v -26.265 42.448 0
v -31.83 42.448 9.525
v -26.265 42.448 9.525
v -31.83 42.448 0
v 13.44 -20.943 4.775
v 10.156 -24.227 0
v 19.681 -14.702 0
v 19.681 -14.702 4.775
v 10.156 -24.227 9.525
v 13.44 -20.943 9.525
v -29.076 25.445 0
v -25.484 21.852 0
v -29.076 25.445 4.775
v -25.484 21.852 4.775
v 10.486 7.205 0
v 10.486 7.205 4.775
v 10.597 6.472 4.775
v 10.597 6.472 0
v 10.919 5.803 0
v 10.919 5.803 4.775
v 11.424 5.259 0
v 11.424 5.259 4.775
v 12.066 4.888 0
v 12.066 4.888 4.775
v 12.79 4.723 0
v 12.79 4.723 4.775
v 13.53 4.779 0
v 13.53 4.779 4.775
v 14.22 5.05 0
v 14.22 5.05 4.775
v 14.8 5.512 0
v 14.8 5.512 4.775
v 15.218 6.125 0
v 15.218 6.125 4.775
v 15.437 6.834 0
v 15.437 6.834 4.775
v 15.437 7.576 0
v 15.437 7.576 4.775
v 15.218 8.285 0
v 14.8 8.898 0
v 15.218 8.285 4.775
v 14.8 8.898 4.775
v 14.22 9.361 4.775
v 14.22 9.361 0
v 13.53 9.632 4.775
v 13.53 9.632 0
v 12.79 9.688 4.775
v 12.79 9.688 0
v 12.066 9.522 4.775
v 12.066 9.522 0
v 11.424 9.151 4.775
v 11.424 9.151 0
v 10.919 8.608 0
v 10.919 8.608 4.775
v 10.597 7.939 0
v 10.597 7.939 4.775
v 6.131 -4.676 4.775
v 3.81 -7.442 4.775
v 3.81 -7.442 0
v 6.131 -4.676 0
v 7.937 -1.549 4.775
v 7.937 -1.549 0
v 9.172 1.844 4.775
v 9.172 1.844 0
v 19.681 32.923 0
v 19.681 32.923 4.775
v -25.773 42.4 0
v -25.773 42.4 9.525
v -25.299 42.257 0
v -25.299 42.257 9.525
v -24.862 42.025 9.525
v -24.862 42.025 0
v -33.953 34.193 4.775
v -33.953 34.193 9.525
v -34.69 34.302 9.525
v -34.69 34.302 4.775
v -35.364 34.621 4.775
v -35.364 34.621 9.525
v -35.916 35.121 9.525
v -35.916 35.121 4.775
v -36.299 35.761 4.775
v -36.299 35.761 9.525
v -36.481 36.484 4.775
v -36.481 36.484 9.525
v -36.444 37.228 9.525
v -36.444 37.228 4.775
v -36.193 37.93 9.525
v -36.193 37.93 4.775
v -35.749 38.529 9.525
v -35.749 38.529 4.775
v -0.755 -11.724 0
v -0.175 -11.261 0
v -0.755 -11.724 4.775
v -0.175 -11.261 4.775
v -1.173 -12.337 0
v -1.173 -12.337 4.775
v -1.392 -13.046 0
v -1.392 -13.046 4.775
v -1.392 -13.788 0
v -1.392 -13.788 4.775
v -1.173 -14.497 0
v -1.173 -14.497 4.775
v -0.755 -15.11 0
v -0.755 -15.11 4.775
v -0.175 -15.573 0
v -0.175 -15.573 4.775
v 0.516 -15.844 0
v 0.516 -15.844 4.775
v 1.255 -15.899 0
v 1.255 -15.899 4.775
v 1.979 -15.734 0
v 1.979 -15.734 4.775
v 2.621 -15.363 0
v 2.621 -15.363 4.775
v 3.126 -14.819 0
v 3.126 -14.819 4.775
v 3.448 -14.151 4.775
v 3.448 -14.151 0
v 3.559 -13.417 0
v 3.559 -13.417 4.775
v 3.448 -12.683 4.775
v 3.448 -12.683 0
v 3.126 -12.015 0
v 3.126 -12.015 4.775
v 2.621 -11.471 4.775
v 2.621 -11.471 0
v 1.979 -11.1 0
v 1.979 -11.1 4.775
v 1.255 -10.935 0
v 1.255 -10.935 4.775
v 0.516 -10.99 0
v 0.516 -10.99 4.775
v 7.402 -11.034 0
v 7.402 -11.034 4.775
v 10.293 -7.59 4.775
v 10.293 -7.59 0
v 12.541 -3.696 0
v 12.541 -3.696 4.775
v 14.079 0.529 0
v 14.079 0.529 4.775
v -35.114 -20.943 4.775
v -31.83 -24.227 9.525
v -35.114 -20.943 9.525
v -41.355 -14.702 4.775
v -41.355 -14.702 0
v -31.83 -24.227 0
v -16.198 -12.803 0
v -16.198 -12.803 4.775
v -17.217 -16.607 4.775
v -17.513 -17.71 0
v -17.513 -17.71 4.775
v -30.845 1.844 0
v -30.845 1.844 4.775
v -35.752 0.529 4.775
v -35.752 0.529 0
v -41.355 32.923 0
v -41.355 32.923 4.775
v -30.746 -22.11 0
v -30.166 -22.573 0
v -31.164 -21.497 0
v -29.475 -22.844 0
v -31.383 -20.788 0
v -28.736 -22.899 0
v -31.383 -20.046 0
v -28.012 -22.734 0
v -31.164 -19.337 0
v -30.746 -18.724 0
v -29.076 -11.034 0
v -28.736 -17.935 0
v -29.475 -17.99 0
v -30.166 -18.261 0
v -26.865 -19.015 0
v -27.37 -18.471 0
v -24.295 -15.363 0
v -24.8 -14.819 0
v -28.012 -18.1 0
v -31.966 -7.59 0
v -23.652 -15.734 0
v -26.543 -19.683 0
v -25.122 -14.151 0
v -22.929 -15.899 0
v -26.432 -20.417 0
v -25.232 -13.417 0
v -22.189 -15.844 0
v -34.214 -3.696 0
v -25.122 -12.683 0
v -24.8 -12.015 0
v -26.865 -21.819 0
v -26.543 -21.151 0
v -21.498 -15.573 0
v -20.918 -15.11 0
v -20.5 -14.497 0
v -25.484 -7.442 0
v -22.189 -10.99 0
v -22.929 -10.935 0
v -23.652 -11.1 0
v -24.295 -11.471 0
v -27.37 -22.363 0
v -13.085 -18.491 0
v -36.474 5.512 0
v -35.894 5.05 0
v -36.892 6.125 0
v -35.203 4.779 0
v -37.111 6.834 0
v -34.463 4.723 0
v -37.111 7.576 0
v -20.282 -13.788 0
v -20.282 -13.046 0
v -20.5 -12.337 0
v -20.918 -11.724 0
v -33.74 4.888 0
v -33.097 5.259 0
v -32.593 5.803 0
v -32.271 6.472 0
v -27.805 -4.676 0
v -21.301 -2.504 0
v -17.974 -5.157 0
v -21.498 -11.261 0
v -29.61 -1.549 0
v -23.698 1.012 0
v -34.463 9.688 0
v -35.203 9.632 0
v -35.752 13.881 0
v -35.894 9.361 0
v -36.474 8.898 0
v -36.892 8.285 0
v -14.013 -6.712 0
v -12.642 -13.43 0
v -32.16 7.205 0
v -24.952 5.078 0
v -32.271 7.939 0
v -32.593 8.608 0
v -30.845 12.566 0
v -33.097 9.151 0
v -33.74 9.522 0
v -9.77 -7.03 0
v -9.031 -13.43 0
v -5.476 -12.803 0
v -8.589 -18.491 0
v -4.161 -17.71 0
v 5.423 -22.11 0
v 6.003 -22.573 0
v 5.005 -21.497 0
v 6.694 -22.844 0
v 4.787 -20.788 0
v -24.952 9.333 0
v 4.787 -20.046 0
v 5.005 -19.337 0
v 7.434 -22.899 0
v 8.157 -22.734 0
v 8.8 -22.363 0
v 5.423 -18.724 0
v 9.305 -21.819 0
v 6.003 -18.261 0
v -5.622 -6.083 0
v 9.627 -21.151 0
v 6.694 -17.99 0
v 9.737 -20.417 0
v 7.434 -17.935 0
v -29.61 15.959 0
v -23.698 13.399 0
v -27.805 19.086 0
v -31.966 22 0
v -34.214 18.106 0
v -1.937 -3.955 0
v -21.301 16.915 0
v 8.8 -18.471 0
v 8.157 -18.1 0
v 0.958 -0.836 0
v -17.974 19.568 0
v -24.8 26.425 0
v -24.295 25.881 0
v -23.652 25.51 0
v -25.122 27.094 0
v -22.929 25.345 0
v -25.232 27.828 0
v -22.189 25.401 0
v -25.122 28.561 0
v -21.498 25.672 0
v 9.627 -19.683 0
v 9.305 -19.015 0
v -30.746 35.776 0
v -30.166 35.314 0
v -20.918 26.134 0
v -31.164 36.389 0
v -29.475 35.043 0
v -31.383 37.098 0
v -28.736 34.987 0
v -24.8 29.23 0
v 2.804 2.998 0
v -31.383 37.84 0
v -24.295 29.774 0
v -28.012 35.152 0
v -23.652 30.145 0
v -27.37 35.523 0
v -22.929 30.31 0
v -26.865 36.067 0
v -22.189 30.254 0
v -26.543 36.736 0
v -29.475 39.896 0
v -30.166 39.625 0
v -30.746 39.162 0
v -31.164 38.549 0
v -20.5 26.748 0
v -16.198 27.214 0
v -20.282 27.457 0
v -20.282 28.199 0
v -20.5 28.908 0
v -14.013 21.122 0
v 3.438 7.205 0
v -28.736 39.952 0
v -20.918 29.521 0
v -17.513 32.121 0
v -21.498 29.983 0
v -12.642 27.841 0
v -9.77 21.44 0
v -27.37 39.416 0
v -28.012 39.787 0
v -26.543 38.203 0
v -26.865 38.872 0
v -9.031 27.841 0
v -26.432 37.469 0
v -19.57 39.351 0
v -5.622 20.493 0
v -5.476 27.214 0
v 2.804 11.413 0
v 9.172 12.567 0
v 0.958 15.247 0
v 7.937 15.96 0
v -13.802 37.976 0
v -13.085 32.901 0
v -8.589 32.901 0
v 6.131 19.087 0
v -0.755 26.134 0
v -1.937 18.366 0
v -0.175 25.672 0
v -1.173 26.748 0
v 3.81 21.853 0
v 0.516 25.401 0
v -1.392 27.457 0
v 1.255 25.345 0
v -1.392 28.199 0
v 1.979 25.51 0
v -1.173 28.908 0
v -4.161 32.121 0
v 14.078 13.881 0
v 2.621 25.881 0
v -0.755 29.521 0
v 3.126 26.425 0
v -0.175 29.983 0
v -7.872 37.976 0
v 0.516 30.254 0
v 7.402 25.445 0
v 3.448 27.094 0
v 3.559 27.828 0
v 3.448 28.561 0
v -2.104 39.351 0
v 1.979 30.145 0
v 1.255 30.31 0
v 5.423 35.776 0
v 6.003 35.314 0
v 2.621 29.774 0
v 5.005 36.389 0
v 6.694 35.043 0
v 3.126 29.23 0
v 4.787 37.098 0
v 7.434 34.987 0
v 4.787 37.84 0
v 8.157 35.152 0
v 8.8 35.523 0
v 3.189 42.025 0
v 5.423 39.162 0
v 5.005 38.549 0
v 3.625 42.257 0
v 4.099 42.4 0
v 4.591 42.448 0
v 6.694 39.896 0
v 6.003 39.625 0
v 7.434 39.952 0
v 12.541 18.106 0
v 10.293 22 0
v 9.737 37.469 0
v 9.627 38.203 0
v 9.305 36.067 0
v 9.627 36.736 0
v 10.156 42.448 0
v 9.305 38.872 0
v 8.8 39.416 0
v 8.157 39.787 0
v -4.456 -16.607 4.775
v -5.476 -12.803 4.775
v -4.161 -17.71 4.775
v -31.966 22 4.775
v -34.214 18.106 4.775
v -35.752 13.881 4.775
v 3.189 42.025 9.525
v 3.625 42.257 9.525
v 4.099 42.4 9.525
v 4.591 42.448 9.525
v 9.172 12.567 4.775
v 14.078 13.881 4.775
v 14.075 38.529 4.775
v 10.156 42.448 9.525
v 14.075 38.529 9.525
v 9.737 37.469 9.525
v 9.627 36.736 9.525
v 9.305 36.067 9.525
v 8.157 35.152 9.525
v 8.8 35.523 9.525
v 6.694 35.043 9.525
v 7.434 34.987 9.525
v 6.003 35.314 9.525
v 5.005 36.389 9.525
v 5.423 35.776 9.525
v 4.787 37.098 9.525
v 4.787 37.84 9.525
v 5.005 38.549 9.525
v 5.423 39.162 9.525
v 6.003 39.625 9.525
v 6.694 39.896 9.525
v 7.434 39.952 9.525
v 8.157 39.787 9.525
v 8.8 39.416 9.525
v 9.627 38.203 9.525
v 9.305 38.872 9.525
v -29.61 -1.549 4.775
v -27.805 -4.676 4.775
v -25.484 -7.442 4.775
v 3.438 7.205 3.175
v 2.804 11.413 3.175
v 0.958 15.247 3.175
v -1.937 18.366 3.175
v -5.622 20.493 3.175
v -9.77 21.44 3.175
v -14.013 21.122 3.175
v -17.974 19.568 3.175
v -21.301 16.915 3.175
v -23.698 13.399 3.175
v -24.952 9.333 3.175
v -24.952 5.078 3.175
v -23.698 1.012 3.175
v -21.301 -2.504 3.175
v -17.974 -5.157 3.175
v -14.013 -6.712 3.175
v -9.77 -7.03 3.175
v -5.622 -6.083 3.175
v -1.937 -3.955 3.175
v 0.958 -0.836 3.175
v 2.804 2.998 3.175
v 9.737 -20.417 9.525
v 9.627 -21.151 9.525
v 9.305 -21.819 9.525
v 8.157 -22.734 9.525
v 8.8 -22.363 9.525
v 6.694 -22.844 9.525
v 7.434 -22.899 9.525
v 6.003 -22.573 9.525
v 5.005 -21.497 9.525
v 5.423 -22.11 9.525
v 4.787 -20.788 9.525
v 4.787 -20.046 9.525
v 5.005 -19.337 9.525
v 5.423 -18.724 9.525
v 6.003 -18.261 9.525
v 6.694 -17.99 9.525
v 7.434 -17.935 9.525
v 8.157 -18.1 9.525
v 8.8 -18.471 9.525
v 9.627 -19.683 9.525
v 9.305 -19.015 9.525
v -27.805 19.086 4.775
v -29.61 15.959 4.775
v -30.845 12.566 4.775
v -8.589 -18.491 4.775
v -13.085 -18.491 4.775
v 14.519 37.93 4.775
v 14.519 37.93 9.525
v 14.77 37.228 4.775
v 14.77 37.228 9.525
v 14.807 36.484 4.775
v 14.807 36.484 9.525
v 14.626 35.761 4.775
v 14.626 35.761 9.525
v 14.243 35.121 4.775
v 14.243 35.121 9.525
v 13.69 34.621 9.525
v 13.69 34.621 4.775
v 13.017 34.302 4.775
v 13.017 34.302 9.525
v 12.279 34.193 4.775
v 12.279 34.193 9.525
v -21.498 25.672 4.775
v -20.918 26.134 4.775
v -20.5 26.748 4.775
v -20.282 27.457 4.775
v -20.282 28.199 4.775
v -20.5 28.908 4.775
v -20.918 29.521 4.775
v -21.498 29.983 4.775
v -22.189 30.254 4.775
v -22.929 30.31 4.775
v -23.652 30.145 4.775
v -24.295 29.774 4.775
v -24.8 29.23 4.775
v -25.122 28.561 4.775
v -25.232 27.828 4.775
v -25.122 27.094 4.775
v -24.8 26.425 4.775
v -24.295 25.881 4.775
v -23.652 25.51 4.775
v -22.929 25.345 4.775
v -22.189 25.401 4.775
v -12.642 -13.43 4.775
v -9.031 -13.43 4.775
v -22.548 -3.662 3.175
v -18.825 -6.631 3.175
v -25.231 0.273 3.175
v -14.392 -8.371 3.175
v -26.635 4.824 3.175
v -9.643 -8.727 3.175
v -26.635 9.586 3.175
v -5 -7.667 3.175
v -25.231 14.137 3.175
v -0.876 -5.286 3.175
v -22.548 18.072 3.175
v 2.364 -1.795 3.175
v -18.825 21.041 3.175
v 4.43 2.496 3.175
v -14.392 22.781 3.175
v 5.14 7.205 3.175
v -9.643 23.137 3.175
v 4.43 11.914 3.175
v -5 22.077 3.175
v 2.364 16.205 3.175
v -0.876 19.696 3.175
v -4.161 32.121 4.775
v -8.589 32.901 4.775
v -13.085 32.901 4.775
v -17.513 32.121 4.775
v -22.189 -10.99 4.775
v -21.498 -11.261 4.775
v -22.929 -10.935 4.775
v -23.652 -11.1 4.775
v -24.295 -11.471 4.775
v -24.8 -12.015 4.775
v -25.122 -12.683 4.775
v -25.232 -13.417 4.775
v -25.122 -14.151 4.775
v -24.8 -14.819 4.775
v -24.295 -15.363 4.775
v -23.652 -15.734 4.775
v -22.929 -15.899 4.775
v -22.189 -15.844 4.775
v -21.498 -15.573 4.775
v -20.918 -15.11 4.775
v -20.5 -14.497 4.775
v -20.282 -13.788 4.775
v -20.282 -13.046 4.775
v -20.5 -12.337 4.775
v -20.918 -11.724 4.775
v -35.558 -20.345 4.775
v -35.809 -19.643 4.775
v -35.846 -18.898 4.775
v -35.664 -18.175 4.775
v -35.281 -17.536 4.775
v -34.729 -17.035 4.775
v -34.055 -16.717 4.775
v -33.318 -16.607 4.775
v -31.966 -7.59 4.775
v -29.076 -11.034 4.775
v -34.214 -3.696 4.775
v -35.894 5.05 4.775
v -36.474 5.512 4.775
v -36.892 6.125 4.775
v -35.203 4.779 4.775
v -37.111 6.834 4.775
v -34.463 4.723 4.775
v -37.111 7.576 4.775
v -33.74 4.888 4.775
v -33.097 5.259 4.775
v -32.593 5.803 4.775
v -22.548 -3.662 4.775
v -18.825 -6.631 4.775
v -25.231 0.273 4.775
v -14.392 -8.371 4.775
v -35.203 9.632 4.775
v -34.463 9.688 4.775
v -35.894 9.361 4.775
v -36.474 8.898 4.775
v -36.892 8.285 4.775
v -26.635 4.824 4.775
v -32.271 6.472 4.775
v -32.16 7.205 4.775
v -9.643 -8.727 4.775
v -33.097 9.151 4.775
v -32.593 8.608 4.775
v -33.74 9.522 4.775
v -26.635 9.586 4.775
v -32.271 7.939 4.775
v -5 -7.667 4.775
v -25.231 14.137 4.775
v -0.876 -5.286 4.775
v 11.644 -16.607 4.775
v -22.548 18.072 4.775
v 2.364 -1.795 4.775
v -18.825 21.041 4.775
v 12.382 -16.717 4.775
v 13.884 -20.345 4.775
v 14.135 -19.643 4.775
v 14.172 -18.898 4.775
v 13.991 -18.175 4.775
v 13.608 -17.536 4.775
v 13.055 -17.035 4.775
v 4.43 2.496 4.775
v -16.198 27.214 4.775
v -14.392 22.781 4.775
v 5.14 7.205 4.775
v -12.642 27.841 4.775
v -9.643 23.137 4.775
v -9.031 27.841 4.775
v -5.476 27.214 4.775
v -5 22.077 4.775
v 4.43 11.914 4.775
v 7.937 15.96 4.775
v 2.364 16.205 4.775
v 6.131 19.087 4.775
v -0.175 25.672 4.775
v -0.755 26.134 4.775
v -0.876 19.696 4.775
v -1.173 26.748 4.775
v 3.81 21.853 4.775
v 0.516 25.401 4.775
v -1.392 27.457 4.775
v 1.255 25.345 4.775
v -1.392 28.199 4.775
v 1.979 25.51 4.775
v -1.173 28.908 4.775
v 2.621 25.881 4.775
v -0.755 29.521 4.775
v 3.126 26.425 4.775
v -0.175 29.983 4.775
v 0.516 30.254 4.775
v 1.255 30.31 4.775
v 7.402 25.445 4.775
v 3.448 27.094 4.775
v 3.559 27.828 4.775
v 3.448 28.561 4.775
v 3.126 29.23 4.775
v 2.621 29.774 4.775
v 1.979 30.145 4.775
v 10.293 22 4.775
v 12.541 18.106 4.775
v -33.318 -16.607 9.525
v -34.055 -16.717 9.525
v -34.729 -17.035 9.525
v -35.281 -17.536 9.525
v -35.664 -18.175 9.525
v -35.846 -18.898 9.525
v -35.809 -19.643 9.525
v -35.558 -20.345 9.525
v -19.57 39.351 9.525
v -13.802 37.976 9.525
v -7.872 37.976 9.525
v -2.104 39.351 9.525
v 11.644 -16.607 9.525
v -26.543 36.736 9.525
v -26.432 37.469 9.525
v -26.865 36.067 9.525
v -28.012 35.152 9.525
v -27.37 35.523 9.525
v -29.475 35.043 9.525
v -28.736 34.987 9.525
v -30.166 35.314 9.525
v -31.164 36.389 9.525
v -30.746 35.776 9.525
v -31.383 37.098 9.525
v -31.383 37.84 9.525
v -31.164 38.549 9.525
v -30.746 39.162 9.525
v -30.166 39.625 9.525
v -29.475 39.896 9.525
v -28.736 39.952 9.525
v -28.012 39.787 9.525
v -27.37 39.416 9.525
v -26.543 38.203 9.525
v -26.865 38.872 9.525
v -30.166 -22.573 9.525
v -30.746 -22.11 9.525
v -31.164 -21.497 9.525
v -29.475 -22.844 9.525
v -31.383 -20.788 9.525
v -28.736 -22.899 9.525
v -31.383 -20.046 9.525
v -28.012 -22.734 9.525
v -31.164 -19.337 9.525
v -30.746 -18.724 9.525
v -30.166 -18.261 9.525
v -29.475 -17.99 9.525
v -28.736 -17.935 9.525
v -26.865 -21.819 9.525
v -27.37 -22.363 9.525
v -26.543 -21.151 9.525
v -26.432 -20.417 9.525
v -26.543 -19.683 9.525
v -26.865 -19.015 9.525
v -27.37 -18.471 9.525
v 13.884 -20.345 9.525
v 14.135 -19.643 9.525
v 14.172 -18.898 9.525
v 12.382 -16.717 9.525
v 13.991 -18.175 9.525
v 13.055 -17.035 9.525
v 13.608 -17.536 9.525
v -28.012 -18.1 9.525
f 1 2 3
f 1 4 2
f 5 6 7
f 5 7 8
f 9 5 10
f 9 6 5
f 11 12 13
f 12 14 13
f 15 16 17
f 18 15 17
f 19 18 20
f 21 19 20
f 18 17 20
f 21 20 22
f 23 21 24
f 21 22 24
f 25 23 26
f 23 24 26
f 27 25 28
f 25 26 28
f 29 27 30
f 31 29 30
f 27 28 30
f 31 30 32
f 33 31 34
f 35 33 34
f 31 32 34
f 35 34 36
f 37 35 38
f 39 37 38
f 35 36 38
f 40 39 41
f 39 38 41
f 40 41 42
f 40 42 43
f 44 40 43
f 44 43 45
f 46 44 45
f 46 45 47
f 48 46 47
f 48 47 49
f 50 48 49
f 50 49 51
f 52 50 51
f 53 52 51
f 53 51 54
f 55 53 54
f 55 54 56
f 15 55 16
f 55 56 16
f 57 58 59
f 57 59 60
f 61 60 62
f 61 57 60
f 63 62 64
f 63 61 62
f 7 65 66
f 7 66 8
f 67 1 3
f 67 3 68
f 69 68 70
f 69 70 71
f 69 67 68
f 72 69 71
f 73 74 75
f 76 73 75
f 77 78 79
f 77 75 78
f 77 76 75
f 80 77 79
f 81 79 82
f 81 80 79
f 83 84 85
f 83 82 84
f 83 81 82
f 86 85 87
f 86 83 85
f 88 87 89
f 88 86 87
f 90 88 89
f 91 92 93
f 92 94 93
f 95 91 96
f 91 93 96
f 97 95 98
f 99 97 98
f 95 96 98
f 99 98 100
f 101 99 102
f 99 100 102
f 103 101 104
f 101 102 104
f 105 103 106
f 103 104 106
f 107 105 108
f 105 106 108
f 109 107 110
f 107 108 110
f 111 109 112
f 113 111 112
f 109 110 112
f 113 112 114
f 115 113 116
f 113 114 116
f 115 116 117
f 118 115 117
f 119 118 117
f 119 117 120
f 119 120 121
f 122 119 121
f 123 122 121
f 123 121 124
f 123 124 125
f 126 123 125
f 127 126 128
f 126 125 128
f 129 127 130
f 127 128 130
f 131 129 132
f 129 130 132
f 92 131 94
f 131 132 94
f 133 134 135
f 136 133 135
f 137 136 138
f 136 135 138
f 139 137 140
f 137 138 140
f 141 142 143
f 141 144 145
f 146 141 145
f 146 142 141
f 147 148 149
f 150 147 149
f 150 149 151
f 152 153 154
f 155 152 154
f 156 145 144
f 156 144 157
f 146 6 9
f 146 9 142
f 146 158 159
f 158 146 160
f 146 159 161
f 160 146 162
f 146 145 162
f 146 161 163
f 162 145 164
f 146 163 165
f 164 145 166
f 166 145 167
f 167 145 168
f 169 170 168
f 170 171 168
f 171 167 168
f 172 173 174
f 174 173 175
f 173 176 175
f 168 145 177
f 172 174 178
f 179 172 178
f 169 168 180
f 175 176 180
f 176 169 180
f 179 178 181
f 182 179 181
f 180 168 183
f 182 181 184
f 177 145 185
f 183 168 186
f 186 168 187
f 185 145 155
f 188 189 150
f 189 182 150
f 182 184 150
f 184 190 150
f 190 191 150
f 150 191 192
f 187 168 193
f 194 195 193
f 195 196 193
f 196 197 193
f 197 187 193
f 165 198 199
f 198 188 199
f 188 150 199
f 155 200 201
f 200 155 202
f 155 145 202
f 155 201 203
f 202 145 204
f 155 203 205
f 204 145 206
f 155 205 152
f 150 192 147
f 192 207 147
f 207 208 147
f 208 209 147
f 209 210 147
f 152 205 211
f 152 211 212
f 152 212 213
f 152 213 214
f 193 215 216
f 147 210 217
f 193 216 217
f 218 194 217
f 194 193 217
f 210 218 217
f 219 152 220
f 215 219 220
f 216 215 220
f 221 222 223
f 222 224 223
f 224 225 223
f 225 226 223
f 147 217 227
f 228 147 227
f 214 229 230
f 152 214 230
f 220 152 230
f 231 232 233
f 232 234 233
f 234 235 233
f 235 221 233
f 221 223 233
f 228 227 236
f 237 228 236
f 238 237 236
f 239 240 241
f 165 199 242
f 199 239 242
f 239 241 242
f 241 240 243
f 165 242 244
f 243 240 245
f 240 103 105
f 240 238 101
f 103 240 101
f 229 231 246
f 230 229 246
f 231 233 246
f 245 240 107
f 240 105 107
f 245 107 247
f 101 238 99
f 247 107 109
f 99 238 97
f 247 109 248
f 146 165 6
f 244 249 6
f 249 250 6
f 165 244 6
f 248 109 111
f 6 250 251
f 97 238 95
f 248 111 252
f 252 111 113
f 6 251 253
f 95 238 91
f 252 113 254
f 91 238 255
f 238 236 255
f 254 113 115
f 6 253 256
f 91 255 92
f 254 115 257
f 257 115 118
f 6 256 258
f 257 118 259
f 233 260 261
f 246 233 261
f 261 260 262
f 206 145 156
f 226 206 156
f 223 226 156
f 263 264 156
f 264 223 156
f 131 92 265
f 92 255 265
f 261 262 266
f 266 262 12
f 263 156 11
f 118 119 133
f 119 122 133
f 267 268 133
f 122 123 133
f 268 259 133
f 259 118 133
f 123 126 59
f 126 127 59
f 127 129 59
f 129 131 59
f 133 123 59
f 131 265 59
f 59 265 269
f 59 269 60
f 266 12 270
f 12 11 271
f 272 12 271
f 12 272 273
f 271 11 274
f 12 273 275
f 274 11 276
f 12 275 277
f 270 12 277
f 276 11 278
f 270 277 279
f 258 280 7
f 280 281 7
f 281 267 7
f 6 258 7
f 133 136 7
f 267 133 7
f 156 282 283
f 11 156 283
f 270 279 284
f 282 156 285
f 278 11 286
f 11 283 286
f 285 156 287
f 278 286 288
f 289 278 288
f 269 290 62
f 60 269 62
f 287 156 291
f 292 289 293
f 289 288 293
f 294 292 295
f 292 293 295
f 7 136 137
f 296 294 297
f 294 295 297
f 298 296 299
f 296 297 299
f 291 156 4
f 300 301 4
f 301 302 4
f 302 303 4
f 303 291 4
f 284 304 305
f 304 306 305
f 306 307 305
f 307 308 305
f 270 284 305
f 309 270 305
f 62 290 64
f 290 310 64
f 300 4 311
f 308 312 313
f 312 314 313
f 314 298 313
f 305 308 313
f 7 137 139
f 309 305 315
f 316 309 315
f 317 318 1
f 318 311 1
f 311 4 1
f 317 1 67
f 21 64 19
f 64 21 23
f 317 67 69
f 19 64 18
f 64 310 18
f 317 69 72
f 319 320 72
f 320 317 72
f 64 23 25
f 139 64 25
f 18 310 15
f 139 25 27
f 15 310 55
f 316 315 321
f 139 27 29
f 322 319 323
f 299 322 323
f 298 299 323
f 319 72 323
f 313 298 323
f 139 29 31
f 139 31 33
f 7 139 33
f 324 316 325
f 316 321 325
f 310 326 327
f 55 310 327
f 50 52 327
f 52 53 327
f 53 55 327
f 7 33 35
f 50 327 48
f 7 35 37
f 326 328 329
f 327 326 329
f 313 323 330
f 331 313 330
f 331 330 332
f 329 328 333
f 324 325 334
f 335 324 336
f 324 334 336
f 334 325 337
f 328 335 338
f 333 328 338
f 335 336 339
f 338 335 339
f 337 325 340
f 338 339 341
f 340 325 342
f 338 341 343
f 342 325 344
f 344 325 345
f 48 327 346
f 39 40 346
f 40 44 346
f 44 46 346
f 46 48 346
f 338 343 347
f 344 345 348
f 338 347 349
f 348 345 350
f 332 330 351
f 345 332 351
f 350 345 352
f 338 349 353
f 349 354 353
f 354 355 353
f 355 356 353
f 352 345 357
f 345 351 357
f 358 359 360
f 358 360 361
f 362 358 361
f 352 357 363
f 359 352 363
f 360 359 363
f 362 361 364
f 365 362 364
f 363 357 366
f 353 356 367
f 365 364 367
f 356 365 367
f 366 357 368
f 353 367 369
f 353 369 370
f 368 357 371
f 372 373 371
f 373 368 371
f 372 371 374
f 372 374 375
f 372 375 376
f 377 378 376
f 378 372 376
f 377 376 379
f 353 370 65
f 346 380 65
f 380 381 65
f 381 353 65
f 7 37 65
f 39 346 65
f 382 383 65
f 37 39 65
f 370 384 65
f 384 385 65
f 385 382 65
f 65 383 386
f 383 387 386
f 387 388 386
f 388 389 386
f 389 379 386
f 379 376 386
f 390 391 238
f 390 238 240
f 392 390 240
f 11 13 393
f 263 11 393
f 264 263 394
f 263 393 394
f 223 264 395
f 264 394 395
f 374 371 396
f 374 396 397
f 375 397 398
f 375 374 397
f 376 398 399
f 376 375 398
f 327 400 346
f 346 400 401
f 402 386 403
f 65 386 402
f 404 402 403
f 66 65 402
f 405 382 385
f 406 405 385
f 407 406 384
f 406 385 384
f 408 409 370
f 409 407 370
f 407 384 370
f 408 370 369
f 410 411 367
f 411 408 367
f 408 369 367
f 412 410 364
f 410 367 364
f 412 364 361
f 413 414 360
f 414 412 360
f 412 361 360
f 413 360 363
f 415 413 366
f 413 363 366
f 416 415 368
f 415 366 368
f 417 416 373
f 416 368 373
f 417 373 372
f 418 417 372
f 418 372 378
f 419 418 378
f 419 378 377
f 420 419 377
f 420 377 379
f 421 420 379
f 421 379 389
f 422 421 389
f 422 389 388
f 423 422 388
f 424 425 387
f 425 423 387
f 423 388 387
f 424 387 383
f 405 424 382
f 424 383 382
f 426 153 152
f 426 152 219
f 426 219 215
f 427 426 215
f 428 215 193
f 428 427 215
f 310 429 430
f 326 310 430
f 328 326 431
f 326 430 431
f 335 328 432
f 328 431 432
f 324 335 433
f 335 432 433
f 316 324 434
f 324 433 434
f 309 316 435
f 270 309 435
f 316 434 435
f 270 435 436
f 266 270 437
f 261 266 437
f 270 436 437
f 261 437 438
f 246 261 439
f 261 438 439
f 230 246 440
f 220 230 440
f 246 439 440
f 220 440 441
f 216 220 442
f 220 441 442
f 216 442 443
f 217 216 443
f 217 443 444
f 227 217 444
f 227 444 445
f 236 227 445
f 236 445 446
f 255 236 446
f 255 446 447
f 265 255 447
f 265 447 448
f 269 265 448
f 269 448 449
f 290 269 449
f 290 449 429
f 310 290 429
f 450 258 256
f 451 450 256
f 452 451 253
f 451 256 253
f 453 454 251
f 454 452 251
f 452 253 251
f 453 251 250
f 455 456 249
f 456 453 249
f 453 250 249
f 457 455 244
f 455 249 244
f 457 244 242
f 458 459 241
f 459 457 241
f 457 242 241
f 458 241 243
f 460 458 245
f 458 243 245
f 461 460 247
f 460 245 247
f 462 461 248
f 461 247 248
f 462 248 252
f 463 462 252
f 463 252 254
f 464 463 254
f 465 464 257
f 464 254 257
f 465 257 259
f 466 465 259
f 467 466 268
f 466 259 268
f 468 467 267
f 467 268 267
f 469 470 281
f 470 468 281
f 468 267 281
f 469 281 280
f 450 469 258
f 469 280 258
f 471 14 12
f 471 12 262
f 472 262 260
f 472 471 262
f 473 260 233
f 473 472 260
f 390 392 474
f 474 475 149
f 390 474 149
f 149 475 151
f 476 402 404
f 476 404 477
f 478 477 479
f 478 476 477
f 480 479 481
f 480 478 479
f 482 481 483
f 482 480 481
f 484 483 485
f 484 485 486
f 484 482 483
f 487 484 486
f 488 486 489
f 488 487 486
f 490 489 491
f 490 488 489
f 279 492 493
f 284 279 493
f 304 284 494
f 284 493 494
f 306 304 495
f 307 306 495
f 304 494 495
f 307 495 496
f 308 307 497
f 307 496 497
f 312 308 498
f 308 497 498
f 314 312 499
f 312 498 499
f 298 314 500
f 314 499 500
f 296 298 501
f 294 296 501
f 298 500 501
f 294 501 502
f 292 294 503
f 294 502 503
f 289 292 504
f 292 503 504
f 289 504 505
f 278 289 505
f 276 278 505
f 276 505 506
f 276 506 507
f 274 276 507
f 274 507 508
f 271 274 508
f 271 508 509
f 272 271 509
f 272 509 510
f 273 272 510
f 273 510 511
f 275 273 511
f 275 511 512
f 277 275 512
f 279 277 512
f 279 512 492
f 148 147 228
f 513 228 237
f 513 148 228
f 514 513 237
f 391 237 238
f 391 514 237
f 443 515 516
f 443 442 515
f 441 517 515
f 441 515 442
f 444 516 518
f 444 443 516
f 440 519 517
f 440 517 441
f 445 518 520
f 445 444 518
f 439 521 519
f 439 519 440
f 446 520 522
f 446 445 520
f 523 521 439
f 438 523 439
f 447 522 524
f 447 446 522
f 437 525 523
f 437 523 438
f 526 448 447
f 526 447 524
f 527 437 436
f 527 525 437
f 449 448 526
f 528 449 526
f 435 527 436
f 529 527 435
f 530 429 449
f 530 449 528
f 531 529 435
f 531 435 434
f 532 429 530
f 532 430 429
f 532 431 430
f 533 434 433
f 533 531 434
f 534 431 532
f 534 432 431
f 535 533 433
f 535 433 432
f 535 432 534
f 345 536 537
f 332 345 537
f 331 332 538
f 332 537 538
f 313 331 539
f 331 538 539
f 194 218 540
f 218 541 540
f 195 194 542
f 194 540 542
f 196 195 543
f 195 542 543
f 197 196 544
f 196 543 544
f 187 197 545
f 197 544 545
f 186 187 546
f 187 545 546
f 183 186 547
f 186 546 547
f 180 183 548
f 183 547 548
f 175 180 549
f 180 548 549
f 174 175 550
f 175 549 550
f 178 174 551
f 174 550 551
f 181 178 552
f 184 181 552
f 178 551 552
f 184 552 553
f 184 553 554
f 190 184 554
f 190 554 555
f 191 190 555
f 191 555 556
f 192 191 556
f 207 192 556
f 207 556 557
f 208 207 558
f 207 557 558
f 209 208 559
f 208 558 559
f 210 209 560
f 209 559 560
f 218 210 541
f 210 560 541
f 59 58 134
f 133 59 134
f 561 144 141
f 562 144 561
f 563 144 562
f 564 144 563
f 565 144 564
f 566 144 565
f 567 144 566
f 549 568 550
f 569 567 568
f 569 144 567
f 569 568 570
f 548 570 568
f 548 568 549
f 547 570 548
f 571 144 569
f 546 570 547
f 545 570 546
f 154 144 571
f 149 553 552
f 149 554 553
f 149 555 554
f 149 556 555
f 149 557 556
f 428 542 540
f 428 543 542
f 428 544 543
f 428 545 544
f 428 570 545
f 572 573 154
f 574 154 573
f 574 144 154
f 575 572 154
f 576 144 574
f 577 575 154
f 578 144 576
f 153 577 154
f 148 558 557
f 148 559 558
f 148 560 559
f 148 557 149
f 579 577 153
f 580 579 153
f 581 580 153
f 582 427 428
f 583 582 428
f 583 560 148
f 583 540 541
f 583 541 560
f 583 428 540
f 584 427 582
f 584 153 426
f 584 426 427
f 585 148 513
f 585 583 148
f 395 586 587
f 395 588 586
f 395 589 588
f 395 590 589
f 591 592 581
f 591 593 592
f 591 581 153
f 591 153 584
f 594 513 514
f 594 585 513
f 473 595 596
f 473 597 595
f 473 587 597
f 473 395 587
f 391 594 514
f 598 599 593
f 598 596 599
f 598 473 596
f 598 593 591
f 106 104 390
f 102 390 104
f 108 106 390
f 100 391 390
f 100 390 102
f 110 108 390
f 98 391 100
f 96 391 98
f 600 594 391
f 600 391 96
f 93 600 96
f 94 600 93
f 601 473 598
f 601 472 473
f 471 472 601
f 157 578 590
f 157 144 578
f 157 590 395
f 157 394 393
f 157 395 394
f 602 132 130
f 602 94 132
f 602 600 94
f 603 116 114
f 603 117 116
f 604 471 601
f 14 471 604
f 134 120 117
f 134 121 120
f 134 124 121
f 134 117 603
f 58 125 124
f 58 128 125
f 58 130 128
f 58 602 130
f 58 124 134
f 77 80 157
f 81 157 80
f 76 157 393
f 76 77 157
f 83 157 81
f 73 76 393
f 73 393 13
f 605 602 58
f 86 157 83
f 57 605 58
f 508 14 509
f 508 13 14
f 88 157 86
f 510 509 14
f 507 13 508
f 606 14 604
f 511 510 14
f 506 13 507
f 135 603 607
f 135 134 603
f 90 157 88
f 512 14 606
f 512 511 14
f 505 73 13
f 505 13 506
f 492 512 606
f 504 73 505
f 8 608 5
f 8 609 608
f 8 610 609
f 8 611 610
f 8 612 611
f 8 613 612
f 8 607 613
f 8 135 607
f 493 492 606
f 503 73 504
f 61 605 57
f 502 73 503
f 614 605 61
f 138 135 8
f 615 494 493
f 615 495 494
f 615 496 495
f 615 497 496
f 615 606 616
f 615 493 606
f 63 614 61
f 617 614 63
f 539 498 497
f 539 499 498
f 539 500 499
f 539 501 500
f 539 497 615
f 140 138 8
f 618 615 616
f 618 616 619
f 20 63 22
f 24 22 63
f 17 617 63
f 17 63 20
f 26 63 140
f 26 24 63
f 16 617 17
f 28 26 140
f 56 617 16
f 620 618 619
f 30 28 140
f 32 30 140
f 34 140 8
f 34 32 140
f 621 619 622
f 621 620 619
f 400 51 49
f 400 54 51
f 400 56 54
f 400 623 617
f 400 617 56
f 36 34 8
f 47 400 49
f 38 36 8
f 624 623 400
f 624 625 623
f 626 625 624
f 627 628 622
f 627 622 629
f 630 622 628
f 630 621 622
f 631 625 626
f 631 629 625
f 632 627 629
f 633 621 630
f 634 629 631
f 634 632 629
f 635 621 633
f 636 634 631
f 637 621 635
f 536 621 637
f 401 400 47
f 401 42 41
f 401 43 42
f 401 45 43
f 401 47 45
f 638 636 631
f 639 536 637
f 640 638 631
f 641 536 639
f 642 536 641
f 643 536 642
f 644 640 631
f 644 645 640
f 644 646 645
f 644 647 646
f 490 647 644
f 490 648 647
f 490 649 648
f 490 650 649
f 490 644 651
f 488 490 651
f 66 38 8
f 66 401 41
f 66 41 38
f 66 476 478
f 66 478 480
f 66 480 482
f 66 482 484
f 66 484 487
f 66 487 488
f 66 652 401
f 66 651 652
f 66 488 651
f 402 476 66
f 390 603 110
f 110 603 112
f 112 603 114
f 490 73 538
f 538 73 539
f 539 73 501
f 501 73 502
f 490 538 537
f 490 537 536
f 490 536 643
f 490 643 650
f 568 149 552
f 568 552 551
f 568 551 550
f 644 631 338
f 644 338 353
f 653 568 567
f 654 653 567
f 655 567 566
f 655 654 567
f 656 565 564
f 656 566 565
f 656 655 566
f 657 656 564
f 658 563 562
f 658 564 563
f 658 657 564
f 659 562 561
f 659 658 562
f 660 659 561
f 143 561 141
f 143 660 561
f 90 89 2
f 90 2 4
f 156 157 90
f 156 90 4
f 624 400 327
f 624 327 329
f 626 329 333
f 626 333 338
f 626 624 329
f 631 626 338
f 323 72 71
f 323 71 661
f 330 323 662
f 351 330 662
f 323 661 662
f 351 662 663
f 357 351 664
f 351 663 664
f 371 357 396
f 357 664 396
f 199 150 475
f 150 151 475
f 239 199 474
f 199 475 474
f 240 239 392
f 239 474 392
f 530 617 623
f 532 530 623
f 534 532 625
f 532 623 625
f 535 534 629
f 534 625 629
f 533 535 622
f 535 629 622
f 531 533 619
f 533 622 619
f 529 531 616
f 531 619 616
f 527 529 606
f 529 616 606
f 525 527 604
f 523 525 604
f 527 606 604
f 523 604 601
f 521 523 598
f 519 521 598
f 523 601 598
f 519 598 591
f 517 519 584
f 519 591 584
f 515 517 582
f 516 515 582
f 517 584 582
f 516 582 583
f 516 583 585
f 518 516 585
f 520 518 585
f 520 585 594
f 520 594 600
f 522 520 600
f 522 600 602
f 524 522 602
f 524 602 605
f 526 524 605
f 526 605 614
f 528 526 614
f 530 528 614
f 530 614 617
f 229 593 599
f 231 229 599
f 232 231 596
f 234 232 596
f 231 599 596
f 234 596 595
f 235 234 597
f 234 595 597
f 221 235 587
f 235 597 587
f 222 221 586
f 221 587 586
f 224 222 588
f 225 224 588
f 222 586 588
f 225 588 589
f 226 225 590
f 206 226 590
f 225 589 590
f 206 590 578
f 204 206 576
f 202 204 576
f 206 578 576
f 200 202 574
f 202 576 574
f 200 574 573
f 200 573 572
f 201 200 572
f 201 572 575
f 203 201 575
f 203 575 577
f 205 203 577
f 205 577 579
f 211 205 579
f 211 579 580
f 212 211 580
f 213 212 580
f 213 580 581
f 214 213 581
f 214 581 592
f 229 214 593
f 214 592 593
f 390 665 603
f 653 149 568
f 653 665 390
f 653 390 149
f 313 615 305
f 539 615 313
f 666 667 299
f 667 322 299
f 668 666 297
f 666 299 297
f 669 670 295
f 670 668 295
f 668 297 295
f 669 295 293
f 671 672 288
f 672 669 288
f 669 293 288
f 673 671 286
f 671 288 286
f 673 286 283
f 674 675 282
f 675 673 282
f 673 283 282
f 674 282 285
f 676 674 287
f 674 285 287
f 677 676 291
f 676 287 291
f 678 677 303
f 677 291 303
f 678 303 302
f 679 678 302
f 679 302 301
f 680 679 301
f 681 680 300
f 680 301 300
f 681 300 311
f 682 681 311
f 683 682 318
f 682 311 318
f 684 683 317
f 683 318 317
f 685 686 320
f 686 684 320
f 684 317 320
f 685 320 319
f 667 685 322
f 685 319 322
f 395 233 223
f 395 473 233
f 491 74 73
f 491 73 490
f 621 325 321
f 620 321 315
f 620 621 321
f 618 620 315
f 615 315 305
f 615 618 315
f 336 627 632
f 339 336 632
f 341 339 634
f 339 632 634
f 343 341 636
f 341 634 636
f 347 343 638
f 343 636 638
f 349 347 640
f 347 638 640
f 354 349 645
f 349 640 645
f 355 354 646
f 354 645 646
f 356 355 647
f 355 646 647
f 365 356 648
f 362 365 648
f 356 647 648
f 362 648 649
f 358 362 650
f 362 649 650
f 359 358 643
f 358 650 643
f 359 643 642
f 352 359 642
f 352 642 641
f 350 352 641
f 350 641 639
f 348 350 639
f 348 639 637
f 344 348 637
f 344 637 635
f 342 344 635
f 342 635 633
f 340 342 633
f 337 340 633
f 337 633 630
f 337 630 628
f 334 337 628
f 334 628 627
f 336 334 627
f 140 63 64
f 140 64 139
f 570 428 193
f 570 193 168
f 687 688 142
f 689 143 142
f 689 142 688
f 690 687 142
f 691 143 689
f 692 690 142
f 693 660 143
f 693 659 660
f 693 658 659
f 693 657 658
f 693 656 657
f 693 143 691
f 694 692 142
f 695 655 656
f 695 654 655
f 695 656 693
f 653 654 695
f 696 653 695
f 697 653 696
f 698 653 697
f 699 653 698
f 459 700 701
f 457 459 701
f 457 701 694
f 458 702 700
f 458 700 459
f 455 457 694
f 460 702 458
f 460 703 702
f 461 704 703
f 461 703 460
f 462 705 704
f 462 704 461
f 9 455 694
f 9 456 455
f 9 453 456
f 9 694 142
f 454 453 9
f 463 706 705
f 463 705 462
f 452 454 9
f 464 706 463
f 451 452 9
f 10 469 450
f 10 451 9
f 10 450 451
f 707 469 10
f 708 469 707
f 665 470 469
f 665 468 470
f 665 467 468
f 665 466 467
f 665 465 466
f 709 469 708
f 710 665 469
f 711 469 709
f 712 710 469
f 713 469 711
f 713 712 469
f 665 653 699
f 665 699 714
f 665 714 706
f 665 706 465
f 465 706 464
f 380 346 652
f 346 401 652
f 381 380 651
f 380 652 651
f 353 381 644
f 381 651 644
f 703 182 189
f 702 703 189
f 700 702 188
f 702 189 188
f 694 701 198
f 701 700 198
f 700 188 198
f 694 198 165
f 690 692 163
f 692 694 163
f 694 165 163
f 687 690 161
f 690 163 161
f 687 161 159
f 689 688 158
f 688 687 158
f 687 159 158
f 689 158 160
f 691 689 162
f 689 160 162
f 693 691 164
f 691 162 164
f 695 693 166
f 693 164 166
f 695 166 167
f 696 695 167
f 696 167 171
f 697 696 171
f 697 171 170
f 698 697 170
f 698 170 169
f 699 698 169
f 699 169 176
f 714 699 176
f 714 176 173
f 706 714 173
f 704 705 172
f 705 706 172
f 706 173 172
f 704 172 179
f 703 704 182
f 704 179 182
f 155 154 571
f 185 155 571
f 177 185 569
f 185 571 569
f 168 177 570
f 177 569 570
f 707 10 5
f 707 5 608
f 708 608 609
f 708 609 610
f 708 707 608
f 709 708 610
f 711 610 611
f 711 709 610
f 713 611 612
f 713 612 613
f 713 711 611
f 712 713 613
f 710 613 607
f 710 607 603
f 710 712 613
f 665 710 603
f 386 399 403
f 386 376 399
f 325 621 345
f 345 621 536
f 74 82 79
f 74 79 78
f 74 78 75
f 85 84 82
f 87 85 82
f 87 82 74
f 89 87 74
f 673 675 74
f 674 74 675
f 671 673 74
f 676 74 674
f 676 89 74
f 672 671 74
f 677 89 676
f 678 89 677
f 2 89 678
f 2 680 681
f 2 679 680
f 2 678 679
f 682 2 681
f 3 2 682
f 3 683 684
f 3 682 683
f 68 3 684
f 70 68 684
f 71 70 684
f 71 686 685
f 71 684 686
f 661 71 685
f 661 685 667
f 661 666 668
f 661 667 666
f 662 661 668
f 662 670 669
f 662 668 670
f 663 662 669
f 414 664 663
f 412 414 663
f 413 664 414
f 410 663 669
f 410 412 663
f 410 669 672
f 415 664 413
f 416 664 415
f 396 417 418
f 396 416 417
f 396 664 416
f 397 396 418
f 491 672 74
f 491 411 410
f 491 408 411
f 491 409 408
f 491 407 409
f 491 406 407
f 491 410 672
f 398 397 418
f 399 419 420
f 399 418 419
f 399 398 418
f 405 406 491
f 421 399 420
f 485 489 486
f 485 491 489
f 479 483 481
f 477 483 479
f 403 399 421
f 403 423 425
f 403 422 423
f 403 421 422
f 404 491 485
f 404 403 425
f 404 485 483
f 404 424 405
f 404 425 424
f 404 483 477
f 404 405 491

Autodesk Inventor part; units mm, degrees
ref_plane "YZ Plane" through (0, 0, 0) normal (1, 0, 0) x (0, 1, 0)
ref_plane "XZ Plane" through (0, 0, 0) normal (0, 1, 0) x (-1, 0, 0)
ref_plane "XY Plane" through (0, 0, 0) normal (0, 0, 1) x (1, 0, 0)
sketch "Sketch2" plane through (0, 0, 0) normal (0, 0, 1) x (1, 0, 0)
  line L0 (-10.8368, 23.5104) -> (-10.8368, -29.6906) construction
  line L1 (-37.8996, -2.6413) -> (16.2259, -2.6413) construction
  circle A0 centre (-28.9216, 37.4694) radius 2.4892
  circle A1 centre (7.248, 37.4694) radius 2.4892
  circle A2 centre (-28.9216, -20.4172) radius 2.4892
  circle A3 centre (7.248, -20.4172) radius 2.4892
  line L2 (-28.9216, 37.4694) -> (7.248, 37.4694) construction
  line L3 (7.248, 37.4694) -> (7.248, -20.4172) construction
  line L4 (7.248, -20.4172) -> (-28.9216, -20.4172) construction
  line L5 (-28.9216, -20.4172) -> (-28.9216, 37.4694) construction
  line L6 (-41.3549, 42.4478) -> (19.6813, 42.4478)
  line L7 (19.6813, 42.4478) -> (19.6813, -24.2272)
  line L8 (19.6813, -24.2272) -> (-41.3549, -24.2272)
  line L9 (-41.3549, -24.2272) -> (-41.3549, 42.4478)
  line L10 (-10.8368, 42.4478) -> (-10.8368, -24.2272) construction
  point P0 (0, 0)
  point P1 (-10.8368, -2.6413)
  dimension "d9" = 36.1696
  dimension "d10" = 57.8866
  dimension "d11" = 4.9784
  dimension "d12" = 61.0362
  dimension "d13" = 66.675
  dimension "d15" = 3.81
extrude "Extrusion1" add sketch "Sketch2" along normal blind 9.525
sketch "Sketch3" plane through (0, 0, 9.525) normal (0, 0, 1) x (1, 0, 0)
  line L0 (-41.3549, 34.1928) -> (19.6813, 34.1928)
  line L1 (19.6813, 34.1928) -> (19.6813, -16.6072)
  line L2 (19.6813, -16.6072) -> (-41.3549, -16.6072)
  line L3 (-41.3549, -16.6072) -> (-41.3549, 34.1928)
  line L4 (19.6813, -24.2272) -> (19.6813, 42.4478) projected
  line L5 (-41.3549, 42.4478) -> (-41.3549, -24.2272) projected
  line L6 (-41.3549, -24.2272) -> (19.6813, -24.2272) projected
  point P0 (0, 0)
  dimension "d18" = 50.8
  dimension "d20" = 7.62
extrude "Extrusion2" cut sketch "Sketch3" against normal blind 4.7498 contours L0 L1 L2 L3
chamfer "Chamfer1" distance 9.525 angle 45 4 edges at (19.6813, 42.4478, 4.7625) (-41.3549, 42.4478, 4.7625) (-41.3549, -24.2272, 4.7625) (19.6813, -24.2272, 4.7625)
fillet "Fillet1" radius 2.54 4 edges at (18.4113, 34.1928, 7.1501) (17.7763, -16.6072, 7.1501) (-39.4499, -16.6072, 7.1501) (-40.0849, 34.1928, 7.1501)
sketch "Sketch4" plane through (0, 0, 4.7752) normal (0, 0, 1) x (1, 0, 0)
  circle A0 centre (-10.8368, 7.2053) radius 14.2748
  line L0 (-41.3549, -14.7022) -> (-41.3549, 32.9228) projected
  line L1 (11.6442, -16.6072) -> (-33.3178, -16.6072) projected
  point P0 (0, 0)
  dimension "d27" = 30.5181
  dimension "d28" = 23.8125
  dimension "d29" = 28.5496
extrude "Extrusion3" cut sketch "Sketch4" against normal blind 4.7752
sketch "Sketch5" plane through (0, 0, 4.7752) normal (0, 0, 1) x (1, 0, 0)
  circle A0 centre (-10.8368, 7.2053) radius 14.2748 projected
  circle A1 centre (-10.8368, 7.2053) radius 15.9766
  point P0 (0, 0)
  dimension "d32" = 31.9532
extrude "Extrusion4" cut sketch "Sketch5" against normal blind 1.6002
sketch "Sketch6" plane through (0, 0, 4.7752) normal (0, 0, 1) x (1, 0, 0)
  circle A0 centre (-10.8368, 7.2053) radius 14.2748 projected
  circle A1 centre (-10.8368, 7.2053) radius 14.2748 projected
  circle A2 centre (-10.8368, 7.2053) radius 23.8125 construction
  circle A3 centre (-34.6493, 7.2053) radius 2.4892
  point P0 (0, 0)
  dimension "d35" = 47.625
  dimension "d36" = 4.9784
extrude "Extrusion5" cut sketch "Sketch6" against normal through all contours A3
pattern_circular "Circular Pattern1" count 6 over 360 about axis through (-10.8368, 7.2053, 4.7752) along (0, 0, -1) of "Extrusion5"
sketch "Sketch7" plane through (0, 0, 4.7752) normal (0, 0, 1) x (1, 0, 0)
  circle A0 centre (-10.8368, 7.2053) radius 14.2748 projected
  arc A1 (-5.4756, 27.2137) -> (-16.1981, 27.2137) centre (-10.8368, 7.2053) ccw
  arc A2 (-4.1608, 32.1206) -> (-17.5129, 32.1206) centre (-10.8368, 7.2053) ccw
  line L0 (-10.8368, 7.2053) -> (-10.8368, 32.9995) construction
  line L1 (-16.1981, 27.2137) -> (-17.5129, 32.1206)
  line L2 (-5.4756, 27.2137) -> (-4.1608, 32.1206)
  point P0 (0, 0)
  dimension "d42" = 5.08
extrude "Extrusion6" cut sketch "Sketch7" against normal through all contours A1 L1 A2 L2
pattern_circular "Circular Pattern2" count 6 over 360 about axis through (-10.8368, 7.2053, 4.7752) along (0, 0, -1) of "Extrusion6"
sketch "Sketch8" plane through (0, 0, 9.525) normal (0, 0, 1) x (1, 0, 0)
  line L0 (10.1563, 42.4478) -> (-31.8299, 42.4478) projected
  arc A0 (-25.4799, 42.4478) -> (3.8063, 42.4478) centre (-10.8368, 63.2021) ccw
  point P0 (0, 0)
  dimension "d49" = 6.35
  dimension "d50" = 6.35
  dimension "d51" = 25.4
extrude "Extrusion7" cut sketch "Sketch8" against normal through all
fillet "Fillet2" radius 2.54 2 edges at (-25.4799, 42.4478, 4.7625) (3.8063, 42.4478, 4.7625)
equation "\"d15\" = d14"
equation "\"d20\" = d19"
equation "\"d14\" = 3.81"
equation "\"d19\" = 2 * d14"
properties part number "Versa Chassis Bearing Block"
